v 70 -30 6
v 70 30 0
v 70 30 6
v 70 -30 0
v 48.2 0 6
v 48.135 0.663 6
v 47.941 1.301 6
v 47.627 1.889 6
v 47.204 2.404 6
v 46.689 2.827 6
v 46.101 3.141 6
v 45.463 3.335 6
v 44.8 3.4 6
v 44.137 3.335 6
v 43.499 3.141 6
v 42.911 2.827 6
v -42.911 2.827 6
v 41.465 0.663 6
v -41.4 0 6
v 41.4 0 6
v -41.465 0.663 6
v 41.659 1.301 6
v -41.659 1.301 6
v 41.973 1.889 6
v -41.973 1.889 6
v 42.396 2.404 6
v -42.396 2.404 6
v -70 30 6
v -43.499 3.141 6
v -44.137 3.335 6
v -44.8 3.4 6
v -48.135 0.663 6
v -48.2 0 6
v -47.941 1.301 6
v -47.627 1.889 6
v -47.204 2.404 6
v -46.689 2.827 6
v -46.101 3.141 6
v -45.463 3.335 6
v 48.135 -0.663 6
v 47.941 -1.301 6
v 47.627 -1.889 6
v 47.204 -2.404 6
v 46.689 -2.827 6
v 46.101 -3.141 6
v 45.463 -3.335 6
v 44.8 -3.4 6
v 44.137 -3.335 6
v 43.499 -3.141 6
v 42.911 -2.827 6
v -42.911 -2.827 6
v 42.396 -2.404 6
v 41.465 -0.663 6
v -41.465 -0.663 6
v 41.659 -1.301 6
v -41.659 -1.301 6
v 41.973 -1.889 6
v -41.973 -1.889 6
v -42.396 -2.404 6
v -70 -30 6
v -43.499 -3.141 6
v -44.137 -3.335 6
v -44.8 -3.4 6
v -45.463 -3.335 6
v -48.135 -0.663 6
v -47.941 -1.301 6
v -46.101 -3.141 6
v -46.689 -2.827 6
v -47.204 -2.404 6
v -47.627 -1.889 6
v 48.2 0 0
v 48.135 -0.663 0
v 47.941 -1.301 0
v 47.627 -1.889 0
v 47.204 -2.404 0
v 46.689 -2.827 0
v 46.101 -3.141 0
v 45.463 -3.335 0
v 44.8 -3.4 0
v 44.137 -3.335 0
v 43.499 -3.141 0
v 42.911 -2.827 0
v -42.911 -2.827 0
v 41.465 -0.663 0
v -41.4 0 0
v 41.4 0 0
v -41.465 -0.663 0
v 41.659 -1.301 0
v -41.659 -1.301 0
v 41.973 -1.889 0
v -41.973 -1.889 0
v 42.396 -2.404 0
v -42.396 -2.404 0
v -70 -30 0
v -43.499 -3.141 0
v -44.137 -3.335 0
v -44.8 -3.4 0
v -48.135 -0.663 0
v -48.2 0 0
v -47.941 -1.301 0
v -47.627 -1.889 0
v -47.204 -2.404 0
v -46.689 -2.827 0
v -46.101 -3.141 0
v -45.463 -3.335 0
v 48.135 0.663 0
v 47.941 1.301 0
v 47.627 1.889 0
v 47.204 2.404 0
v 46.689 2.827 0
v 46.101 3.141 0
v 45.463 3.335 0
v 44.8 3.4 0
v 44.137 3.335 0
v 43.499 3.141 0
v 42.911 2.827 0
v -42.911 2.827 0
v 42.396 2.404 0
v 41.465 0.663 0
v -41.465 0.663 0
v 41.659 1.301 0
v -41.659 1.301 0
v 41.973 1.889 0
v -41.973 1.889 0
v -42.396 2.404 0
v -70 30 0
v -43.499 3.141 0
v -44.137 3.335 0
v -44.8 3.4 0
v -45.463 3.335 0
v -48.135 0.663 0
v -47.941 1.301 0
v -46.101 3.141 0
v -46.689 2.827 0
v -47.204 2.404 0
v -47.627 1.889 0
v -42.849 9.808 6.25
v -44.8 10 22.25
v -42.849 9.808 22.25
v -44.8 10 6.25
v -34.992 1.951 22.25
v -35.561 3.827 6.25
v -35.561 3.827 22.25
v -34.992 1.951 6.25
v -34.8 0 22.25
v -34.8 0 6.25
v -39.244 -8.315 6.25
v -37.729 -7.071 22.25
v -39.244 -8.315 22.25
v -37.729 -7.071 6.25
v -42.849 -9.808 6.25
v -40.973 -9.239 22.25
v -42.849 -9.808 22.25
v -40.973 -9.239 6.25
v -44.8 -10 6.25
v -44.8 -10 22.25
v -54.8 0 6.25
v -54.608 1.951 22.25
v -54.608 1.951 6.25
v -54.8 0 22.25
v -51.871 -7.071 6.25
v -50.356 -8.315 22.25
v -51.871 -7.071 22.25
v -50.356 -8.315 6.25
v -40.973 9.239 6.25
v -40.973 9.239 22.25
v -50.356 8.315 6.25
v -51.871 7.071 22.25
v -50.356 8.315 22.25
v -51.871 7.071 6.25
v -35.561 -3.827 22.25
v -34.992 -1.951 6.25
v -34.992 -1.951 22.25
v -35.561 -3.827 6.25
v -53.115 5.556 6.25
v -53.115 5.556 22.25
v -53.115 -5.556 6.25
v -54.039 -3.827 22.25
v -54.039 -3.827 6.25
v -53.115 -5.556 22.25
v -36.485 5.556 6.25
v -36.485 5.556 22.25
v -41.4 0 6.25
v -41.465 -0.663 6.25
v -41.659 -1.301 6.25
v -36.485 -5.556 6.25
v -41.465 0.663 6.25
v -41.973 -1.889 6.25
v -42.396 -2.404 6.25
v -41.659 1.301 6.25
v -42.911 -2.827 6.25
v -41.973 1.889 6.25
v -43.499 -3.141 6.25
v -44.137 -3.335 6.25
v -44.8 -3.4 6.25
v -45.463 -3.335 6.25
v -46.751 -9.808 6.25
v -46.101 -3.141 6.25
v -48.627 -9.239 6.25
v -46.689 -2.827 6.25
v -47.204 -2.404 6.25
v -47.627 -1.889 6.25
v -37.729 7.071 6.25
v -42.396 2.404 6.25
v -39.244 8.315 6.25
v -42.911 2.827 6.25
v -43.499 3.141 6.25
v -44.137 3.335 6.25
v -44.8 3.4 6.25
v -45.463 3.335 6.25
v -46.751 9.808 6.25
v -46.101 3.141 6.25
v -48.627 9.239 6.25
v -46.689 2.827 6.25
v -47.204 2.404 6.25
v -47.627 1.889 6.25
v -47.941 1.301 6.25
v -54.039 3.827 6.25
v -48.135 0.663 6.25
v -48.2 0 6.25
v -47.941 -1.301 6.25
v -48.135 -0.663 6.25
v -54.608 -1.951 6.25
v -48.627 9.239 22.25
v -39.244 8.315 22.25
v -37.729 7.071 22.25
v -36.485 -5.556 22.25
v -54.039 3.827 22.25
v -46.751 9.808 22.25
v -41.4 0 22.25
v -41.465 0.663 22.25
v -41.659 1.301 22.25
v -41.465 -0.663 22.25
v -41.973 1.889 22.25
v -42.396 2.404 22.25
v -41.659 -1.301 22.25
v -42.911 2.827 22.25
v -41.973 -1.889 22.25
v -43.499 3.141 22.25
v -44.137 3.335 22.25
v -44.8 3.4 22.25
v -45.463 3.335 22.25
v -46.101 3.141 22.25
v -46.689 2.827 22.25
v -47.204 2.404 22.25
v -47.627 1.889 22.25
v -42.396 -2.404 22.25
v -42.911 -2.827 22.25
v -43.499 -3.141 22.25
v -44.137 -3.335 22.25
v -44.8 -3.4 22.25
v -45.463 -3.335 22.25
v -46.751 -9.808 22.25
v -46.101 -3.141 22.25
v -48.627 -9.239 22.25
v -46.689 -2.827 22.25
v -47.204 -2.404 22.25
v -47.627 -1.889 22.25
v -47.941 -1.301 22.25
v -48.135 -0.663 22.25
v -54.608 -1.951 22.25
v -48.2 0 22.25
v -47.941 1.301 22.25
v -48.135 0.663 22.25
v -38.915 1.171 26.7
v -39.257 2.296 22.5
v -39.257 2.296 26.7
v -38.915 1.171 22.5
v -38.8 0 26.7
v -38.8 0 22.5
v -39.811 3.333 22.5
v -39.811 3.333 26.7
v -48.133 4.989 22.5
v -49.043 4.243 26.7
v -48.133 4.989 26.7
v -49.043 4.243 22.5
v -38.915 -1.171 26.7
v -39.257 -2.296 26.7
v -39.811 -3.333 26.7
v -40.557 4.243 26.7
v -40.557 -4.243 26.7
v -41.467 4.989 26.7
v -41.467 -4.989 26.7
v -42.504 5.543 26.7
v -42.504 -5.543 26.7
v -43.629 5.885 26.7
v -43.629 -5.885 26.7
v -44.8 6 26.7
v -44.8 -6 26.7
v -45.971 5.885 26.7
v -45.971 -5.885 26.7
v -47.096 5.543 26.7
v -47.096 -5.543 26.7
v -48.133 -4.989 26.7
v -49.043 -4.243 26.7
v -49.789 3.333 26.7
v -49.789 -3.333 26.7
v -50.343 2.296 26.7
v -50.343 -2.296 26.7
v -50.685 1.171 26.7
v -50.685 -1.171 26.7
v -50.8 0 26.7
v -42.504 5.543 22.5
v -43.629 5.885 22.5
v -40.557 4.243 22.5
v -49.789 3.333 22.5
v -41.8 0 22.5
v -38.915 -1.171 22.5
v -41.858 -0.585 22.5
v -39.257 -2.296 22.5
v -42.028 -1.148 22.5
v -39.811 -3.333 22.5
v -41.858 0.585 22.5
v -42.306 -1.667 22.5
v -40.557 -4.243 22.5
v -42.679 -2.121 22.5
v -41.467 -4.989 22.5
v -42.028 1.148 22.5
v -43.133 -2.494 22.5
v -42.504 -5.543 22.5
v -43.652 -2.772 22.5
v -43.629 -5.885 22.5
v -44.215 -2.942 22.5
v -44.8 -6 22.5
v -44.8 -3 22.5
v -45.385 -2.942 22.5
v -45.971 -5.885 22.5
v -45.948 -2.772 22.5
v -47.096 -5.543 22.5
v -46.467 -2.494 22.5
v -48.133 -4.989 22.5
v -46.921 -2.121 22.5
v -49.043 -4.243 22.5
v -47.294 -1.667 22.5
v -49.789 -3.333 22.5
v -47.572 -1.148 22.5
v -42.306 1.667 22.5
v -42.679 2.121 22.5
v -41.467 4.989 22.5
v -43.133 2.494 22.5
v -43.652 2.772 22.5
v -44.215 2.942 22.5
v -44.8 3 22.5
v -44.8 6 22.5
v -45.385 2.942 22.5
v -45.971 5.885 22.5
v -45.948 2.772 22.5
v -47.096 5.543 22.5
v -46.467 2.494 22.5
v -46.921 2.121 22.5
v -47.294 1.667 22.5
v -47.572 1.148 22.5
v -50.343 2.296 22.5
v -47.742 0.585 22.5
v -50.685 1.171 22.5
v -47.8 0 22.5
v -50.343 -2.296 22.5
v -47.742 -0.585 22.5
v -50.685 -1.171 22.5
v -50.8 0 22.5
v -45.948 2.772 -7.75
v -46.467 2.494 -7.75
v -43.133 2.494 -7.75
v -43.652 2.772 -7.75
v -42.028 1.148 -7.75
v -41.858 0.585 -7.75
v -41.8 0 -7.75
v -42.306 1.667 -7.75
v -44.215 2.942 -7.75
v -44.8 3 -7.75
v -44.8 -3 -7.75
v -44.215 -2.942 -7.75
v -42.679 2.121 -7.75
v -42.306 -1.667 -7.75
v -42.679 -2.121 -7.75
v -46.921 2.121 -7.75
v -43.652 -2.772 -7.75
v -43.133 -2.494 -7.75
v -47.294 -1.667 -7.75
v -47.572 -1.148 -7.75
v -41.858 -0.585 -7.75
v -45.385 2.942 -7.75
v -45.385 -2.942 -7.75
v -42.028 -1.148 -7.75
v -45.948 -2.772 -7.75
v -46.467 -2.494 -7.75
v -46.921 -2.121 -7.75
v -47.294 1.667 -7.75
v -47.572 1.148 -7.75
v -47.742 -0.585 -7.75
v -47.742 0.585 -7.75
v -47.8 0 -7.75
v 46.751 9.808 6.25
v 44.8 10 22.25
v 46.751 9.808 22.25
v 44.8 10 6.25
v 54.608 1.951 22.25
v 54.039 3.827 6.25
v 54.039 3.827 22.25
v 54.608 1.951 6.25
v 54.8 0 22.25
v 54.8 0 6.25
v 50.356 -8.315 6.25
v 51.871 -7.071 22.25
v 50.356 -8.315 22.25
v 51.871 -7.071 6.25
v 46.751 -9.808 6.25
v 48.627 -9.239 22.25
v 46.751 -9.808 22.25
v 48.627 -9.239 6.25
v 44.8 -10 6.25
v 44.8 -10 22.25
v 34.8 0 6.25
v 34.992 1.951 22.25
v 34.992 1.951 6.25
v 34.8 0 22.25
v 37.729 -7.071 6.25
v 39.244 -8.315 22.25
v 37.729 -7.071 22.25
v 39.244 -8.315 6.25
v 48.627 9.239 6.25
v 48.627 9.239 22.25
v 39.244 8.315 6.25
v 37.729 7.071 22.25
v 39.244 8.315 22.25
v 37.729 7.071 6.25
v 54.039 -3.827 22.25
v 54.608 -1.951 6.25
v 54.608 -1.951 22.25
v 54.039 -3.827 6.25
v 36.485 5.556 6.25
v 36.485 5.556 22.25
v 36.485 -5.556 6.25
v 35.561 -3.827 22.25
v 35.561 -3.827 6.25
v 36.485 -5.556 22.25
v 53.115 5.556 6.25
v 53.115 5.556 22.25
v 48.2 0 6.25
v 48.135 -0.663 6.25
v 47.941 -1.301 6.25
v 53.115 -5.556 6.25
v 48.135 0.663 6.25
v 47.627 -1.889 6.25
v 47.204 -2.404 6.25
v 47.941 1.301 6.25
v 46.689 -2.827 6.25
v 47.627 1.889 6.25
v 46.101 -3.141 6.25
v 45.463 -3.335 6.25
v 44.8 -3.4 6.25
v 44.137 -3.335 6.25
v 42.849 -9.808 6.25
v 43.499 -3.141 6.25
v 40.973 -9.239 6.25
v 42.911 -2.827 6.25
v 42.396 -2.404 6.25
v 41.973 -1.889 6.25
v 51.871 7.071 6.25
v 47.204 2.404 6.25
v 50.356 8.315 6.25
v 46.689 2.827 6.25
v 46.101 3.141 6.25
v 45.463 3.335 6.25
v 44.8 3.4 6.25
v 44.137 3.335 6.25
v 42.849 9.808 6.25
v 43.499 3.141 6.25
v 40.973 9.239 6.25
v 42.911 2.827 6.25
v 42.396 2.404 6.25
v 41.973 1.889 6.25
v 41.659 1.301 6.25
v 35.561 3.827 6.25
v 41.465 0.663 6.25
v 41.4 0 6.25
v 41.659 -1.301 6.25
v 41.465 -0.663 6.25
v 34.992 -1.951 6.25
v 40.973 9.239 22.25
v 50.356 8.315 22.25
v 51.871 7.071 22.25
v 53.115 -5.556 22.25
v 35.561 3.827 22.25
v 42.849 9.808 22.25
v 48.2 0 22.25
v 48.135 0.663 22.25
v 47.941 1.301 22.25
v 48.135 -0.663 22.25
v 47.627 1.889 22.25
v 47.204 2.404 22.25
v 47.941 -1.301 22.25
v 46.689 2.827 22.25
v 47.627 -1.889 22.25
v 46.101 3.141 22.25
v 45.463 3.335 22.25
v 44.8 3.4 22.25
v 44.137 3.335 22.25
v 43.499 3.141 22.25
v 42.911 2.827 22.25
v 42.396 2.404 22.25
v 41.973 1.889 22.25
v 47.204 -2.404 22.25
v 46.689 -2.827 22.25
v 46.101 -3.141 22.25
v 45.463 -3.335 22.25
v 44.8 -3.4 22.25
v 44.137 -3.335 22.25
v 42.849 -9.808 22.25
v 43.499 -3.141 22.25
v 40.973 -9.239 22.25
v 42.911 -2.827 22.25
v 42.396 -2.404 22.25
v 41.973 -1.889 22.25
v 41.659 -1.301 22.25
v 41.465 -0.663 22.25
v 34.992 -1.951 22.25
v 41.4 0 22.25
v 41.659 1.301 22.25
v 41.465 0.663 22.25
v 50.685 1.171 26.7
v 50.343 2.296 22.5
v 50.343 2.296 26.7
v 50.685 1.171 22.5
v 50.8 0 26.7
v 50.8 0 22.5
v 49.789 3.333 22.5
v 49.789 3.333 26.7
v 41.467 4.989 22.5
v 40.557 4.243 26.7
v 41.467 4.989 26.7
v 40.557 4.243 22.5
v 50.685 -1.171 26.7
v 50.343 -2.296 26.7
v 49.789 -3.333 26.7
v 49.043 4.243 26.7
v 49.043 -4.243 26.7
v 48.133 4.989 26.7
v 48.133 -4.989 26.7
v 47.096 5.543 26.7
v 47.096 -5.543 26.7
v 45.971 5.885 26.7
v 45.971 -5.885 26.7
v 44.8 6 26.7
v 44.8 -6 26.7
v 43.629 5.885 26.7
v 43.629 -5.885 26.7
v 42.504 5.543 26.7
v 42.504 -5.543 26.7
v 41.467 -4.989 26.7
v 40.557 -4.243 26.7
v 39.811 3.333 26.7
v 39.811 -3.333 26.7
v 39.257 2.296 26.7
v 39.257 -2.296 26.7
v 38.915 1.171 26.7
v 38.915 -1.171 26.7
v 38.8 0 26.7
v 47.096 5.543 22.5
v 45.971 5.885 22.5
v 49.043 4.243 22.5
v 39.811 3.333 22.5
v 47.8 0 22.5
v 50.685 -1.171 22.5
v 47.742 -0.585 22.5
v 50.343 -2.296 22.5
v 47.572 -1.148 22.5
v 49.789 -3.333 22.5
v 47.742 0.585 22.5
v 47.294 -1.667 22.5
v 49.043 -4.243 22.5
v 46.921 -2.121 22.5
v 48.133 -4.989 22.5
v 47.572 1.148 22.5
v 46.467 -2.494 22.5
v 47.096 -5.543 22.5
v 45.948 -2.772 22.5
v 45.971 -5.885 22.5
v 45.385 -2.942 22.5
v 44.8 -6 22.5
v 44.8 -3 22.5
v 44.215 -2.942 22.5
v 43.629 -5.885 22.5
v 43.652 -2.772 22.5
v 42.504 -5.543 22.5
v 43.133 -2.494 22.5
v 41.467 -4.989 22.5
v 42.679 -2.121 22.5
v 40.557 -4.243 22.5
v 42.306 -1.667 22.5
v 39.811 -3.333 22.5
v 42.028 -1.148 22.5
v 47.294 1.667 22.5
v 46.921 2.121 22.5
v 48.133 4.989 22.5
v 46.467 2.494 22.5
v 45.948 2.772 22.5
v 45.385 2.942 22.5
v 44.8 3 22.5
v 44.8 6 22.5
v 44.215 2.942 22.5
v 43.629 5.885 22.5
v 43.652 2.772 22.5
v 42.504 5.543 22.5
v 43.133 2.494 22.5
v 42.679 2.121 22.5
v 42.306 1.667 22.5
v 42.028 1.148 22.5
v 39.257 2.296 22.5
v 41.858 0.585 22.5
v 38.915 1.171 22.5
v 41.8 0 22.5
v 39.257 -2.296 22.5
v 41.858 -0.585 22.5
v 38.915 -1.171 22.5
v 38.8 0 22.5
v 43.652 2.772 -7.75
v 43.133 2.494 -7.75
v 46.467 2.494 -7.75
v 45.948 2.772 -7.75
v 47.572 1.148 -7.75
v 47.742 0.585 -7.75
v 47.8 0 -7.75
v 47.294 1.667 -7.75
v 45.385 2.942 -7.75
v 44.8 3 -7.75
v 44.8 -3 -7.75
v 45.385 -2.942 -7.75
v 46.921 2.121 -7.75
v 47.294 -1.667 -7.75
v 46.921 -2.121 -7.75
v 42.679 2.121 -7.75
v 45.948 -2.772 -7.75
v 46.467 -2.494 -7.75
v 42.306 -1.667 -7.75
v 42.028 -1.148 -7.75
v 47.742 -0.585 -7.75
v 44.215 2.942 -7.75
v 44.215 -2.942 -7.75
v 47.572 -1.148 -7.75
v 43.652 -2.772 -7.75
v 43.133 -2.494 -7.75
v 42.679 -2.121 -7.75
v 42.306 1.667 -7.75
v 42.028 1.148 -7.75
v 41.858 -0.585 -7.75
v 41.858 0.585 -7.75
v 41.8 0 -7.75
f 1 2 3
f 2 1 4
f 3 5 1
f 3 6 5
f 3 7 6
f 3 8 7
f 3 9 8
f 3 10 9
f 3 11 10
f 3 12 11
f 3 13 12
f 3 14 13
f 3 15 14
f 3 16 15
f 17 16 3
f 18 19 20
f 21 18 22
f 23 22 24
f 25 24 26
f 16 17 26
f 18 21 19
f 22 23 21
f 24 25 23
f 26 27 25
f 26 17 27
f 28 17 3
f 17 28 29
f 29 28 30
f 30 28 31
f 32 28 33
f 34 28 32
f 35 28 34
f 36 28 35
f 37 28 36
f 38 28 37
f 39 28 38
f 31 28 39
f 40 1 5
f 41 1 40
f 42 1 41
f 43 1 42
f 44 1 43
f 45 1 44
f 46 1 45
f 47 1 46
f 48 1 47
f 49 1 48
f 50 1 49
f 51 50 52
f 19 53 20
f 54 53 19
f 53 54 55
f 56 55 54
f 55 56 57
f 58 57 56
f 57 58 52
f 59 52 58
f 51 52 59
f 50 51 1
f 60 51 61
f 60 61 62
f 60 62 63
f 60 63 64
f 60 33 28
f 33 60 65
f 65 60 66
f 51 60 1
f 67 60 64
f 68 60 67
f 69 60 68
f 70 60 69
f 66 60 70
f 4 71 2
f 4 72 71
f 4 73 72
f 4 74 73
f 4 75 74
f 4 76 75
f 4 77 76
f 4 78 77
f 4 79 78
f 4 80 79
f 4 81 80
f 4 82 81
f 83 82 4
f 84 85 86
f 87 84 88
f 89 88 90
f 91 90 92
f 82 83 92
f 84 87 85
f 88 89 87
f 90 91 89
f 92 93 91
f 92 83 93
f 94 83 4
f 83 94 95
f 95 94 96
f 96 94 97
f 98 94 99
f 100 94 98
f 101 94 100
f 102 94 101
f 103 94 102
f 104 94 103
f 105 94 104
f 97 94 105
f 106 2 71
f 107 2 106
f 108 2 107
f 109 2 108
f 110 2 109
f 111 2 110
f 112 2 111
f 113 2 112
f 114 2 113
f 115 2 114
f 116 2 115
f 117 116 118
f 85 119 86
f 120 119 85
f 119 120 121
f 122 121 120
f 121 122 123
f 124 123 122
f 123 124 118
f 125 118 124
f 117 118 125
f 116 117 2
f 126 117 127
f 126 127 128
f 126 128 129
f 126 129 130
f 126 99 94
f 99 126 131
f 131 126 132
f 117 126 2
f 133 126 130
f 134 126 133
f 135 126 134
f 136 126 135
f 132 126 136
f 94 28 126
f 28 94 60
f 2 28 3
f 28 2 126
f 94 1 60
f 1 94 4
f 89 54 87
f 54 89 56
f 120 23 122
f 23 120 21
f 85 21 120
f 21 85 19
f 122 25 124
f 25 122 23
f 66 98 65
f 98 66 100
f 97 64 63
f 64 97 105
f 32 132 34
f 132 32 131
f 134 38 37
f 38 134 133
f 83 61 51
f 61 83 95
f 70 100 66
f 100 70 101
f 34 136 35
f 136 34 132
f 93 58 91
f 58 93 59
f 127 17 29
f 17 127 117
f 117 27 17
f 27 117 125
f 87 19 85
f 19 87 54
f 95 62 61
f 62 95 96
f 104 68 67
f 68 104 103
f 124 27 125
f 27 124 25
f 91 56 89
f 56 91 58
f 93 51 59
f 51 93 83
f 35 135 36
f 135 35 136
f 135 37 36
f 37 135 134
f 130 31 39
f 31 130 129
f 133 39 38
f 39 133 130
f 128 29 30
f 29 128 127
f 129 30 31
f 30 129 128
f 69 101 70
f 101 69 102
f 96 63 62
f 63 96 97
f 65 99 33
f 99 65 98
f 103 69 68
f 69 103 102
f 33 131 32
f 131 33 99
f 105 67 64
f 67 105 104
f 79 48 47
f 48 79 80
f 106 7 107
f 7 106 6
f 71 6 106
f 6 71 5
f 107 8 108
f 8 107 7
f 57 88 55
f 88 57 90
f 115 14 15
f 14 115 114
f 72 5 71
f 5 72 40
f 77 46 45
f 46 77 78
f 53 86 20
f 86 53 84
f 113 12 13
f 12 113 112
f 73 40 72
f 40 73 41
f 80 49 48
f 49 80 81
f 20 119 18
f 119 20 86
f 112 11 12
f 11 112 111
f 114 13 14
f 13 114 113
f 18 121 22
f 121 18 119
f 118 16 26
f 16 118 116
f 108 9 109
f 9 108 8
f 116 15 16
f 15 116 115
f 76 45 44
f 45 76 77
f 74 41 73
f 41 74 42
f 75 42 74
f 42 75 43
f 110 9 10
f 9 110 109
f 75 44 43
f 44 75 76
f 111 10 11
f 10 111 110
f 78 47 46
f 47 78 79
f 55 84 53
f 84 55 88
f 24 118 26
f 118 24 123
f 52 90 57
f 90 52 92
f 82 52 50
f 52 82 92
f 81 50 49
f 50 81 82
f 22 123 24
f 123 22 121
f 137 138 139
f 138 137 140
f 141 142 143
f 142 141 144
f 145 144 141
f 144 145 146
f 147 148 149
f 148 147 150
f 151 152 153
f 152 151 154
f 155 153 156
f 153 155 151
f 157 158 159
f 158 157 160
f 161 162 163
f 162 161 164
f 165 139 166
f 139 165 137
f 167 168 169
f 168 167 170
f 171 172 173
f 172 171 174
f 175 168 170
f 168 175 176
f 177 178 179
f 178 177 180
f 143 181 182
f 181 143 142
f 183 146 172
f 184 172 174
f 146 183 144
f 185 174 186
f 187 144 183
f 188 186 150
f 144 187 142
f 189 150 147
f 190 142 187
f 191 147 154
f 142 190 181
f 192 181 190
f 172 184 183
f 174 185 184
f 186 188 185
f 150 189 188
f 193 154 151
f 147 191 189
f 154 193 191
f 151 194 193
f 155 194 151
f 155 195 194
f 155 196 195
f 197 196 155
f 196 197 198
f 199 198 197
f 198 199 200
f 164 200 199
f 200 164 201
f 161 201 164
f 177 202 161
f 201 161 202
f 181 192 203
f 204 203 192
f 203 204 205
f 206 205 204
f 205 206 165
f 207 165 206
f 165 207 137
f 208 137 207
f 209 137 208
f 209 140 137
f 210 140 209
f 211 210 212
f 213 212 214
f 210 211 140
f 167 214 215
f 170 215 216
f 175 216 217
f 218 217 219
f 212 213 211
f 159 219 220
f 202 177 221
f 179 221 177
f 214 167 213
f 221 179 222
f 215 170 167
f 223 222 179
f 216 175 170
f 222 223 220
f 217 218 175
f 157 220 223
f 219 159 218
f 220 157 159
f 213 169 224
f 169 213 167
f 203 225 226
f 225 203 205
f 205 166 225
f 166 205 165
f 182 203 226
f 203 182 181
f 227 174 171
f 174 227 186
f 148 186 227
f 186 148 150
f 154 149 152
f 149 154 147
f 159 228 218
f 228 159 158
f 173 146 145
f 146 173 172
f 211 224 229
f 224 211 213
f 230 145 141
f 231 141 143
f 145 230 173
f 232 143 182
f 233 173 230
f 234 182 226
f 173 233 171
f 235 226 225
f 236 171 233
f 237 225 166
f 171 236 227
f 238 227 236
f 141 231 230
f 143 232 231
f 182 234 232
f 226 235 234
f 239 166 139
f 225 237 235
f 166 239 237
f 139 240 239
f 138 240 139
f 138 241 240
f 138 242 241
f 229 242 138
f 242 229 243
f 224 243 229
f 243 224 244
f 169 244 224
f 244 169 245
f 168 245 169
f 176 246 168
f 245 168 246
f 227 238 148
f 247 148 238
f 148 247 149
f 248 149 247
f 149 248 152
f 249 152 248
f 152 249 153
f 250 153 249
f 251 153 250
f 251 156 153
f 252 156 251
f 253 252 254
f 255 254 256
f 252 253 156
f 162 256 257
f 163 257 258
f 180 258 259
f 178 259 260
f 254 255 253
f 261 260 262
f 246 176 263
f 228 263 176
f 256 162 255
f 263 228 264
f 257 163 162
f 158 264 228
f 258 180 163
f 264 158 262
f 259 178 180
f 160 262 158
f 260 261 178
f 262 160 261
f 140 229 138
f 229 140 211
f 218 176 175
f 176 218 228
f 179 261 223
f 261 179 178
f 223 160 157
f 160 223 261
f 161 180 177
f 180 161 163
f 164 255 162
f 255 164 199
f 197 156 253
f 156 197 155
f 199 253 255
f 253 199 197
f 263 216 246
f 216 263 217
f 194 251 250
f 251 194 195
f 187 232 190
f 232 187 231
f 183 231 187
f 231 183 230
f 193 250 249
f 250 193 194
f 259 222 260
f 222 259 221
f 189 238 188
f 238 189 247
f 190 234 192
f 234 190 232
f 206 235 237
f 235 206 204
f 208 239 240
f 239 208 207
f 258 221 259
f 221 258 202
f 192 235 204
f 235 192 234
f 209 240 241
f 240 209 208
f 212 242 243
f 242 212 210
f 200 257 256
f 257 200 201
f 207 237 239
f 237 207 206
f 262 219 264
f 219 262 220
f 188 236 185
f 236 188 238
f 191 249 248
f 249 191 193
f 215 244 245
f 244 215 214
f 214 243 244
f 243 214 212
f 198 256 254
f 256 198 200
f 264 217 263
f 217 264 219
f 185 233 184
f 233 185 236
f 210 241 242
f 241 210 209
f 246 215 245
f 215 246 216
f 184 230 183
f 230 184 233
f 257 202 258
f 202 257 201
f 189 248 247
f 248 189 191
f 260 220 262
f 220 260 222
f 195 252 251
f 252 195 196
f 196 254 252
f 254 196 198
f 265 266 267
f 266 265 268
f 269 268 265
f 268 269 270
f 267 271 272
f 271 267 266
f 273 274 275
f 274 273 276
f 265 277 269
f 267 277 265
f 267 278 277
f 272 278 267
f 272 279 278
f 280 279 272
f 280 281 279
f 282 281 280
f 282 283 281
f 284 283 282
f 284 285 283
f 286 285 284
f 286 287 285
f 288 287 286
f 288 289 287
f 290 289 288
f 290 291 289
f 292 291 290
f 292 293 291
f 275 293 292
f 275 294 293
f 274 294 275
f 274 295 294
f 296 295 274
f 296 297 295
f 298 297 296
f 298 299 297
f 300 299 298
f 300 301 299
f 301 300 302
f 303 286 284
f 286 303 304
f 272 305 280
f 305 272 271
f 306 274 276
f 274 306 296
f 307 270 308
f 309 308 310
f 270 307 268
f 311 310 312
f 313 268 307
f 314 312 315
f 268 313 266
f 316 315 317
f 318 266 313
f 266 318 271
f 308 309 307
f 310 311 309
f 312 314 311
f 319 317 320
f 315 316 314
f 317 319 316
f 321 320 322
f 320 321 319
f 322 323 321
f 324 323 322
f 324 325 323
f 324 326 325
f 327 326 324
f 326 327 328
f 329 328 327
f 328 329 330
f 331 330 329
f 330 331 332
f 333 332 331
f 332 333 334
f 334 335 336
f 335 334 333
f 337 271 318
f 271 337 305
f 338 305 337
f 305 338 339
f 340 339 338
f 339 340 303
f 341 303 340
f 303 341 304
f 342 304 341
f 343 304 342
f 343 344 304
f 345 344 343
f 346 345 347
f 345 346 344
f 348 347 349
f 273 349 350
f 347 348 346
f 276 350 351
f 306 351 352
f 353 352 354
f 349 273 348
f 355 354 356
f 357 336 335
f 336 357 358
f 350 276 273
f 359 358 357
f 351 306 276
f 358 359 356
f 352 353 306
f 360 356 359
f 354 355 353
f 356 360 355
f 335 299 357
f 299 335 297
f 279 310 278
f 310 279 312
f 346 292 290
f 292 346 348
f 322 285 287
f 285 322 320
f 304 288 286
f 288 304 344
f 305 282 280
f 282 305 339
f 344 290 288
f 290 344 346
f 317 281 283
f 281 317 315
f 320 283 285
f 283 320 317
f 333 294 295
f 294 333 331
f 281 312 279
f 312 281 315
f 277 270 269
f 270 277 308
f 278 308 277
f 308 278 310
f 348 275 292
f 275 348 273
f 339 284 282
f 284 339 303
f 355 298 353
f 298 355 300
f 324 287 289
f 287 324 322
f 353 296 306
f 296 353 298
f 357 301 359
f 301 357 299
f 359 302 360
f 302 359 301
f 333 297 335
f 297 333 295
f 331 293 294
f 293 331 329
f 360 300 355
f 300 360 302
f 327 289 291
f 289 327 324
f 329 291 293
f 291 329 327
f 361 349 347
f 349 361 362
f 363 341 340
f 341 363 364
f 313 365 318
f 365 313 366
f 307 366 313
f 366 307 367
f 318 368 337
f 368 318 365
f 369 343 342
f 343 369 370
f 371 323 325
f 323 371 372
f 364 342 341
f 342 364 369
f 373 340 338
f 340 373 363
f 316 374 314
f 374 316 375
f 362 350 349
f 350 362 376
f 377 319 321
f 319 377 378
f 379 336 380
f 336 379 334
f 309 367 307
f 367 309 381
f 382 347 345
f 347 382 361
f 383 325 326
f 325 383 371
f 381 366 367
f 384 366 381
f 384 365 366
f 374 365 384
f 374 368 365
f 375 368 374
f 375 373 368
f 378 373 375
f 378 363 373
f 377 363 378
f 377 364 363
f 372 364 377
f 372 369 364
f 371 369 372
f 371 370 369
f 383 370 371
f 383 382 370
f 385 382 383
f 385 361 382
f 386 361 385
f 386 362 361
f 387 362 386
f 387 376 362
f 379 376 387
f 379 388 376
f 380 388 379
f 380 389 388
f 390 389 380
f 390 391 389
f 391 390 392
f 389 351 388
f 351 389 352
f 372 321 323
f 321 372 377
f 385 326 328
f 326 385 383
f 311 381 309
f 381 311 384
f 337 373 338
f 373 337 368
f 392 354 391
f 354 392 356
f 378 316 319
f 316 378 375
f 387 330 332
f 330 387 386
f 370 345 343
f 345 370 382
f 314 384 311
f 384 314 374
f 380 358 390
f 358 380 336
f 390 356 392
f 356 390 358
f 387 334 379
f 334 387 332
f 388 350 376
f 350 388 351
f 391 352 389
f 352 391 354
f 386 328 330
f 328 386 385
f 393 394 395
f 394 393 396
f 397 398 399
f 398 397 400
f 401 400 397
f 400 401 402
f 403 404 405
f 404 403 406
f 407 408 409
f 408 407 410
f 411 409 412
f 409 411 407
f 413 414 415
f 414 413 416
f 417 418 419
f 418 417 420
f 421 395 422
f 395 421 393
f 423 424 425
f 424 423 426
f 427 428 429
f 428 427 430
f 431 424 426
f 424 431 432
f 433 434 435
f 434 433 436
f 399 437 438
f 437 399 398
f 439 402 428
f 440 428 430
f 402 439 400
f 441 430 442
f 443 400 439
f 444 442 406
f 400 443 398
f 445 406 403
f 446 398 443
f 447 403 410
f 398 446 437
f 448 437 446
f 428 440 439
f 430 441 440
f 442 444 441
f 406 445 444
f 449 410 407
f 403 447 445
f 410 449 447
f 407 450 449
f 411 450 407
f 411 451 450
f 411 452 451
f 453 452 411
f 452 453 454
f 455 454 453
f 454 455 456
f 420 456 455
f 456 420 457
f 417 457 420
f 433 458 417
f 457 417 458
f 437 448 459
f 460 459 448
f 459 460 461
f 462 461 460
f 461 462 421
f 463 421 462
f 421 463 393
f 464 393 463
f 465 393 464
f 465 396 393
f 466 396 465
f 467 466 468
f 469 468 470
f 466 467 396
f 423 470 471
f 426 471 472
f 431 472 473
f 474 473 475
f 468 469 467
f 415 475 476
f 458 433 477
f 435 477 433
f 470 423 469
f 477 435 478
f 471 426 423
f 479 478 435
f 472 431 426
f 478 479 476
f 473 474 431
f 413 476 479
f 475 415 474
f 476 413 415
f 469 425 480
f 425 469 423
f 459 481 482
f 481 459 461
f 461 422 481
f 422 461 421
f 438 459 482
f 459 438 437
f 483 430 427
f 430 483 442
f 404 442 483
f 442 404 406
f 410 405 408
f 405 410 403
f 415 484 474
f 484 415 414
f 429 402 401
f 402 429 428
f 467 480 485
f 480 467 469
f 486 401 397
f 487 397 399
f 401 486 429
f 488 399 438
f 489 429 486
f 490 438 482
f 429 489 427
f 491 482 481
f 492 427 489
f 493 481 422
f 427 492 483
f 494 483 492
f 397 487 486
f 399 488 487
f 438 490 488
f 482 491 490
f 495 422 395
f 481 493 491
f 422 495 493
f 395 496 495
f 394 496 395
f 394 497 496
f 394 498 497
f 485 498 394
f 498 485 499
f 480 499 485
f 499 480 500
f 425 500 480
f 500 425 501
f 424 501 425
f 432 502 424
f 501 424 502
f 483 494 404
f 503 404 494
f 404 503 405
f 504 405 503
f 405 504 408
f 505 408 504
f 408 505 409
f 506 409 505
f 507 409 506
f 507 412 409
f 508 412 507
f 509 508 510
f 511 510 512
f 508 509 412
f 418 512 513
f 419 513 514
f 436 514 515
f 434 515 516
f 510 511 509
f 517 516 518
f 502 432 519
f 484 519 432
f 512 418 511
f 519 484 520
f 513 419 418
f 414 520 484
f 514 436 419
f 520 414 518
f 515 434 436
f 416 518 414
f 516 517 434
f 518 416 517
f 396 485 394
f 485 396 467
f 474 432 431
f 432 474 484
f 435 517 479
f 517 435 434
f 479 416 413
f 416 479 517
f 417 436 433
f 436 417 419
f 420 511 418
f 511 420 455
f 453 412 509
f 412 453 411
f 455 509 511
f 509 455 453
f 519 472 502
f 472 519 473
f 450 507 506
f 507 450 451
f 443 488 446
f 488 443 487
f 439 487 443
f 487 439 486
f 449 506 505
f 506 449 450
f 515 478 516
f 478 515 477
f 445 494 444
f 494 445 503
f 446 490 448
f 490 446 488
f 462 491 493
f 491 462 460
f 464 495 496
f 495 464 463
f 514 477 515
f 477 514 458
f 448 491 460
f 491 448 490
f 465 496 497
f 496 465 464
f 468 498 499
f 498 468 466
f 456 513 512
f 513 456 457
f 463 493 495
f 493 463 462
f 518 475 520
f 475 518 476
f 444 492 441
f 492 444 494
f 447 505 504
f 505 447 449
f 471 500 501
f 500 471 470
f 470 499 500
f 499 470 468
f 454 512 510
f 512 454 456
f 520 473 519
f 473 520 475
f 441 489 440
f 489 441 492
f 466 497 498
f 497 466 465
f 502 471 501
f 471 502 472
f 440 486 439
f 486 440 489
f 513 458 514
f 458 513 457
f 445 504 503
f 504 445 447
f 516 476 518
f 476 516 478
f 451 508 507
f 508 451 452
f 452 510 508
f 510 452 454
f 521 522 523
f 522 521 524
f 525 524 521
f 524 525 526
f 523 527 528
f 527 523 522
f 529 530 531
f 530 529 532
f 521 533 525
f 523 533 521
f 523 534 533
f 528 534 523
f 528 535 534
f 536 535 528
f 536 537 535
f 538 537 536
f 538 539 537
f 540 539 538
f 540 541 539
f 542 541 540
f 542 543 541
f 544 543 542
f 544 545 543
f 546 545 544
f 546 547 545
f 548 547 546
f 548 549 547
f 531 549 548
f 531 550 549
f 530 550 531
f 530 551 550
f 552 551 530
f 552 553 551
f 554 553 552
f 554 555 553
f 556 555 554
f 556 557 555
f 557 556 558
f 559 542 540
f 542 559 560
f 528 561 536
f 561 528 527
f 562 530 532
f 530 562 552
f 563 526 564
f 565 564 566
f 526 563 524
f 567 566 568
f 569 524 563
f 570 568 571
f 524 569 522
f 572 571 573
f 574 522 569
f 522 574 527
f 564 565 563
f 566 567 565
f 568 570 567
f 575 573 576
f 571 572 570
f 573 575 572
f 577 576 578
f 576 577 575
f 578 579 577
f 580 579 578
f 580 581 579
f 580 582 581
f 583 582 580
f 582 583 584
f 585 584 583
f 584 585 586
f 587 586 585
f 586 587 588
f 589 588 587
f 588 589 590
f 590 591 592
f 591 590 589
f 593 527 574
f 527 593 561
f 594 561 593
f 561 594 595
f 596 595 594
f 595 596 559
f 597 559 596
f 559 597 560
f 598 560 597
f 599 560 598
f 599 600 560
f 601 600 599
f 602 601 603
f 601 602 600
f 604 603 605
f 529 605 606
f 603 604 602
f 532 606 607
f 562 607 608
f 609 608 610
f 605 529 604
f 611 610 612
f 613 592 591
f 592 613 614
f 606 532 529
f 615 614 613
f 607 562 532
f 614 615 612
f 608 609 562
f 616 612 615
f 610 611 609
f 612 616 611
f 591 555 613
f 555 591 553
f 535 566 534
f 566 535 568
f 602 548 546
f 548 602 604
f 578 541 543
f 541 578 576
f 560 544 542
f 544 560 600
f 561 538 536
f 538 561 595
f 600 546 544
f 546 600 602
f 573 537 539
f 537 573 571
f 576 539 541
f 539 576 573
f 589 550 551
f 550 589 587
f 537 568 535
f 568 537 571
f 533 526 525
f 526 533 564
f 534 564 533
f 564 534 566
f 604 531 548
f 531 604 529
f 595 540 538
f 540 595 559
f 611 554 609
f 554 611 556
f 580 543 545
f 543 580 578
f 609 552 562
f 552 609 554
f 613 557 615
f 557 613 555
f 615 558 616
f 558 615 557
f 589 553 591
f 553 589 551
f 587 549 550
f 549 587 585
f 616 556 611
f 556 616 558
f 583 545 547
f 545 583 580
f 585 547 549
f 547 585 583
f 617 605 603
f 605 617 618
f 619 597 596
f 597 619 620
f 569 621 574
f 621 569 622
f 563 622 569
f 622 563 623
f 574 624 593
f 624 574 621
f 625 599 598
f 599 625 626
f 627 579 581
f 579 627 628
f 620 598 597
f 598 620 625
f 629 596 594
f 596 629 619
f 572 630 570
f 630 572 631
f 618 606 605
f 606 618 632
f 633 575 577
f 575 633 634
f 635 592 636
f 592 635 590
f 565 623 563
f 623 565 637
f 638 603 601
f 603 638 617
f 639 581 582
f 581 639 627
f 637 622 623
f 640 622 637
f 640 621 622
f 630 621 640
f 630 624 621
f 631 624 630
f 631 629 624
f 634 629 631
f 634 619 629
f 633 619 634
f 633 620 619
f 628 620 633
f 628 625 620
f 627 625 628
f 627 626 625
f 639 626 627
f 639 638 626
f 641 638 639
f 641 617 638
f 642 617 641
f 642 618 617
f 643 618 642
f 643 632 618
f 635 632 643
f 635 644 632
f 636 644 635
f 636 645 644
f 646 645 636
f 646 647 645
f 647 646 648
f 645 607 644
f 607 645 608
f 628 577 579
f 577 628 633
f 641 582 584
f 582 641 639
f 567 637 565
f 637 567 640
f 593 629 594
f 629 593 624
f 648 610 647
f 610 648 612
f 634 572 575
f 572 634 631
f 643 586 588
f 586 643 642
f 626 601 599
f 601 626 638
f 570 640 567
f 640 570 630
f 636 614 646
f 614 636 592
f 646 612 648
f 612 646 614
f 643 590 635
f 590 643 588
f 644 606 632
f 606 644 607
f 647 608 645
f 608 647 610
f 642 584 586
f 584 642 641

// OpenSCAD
$fn = 32;

// ------------------------------------------------------------------------
// Standoff columns: 2 d20 standoffs, bolts d6
// Every part is its own module, assembly() places them once.
// ------------------------------------------------------------------------

// --- part 1 ---
module base_plate() {
  difference() {
    translate([-70, -30, 0]) cube([140, 60, 6]);
    translate([-44.8, 0, -1]) cylinder(h = 8, d = 6.8);
    translate([44.8, 0, -1]) cylinder(h = 8, d = 6.8);
  }
}

// --- part 2 ---
module spacer1() {
  difference() {
      translate([0, 0, 0]) cylinder(h = 16, d = 20);
      translate([0, 0, -1]) cylinder(h = 18, d = 6.8);
    }
}

// --- part 3 ---
module bolt1() {
  cylinder(h = 4.2, d = 12);
  translate([0, 0, -30.25]) cylinder(h = 30.25, d = 6);
}

// --- part 4 ---
module spacer2() {
  difference() {
      translate([0, 0, 0]) cylinder(h = 16, d = 20);
      translate([0, 0, -1]) cylinder(h = 18, d = 6.8);
    }
}

// --- part 5 ---
module bolt2() {
  cylinder(h = 4.2, d = 12);
  translate([0, 0, -30.25]) cylinder(h = 30.25, d = 6);
}

// --- assembly ---
module assembly() {
  translate([0, 0, 0]) rotate([0, 0, 0]) base_plate();
  translate([-44.8, 0, 6.25]) rotate([0, 0, 0]) spacer1();
  translate([-44.8, 0, 22.5]) rotate([0, 0, 0]) bolt1();
  translate([44.8, 0, 6.25]) rotate([0, 0, 0]) spacer2();
  translate([44.8, 0, 22.5]) rotate([0, 0, 0]) bolt2();
}

assembly();
